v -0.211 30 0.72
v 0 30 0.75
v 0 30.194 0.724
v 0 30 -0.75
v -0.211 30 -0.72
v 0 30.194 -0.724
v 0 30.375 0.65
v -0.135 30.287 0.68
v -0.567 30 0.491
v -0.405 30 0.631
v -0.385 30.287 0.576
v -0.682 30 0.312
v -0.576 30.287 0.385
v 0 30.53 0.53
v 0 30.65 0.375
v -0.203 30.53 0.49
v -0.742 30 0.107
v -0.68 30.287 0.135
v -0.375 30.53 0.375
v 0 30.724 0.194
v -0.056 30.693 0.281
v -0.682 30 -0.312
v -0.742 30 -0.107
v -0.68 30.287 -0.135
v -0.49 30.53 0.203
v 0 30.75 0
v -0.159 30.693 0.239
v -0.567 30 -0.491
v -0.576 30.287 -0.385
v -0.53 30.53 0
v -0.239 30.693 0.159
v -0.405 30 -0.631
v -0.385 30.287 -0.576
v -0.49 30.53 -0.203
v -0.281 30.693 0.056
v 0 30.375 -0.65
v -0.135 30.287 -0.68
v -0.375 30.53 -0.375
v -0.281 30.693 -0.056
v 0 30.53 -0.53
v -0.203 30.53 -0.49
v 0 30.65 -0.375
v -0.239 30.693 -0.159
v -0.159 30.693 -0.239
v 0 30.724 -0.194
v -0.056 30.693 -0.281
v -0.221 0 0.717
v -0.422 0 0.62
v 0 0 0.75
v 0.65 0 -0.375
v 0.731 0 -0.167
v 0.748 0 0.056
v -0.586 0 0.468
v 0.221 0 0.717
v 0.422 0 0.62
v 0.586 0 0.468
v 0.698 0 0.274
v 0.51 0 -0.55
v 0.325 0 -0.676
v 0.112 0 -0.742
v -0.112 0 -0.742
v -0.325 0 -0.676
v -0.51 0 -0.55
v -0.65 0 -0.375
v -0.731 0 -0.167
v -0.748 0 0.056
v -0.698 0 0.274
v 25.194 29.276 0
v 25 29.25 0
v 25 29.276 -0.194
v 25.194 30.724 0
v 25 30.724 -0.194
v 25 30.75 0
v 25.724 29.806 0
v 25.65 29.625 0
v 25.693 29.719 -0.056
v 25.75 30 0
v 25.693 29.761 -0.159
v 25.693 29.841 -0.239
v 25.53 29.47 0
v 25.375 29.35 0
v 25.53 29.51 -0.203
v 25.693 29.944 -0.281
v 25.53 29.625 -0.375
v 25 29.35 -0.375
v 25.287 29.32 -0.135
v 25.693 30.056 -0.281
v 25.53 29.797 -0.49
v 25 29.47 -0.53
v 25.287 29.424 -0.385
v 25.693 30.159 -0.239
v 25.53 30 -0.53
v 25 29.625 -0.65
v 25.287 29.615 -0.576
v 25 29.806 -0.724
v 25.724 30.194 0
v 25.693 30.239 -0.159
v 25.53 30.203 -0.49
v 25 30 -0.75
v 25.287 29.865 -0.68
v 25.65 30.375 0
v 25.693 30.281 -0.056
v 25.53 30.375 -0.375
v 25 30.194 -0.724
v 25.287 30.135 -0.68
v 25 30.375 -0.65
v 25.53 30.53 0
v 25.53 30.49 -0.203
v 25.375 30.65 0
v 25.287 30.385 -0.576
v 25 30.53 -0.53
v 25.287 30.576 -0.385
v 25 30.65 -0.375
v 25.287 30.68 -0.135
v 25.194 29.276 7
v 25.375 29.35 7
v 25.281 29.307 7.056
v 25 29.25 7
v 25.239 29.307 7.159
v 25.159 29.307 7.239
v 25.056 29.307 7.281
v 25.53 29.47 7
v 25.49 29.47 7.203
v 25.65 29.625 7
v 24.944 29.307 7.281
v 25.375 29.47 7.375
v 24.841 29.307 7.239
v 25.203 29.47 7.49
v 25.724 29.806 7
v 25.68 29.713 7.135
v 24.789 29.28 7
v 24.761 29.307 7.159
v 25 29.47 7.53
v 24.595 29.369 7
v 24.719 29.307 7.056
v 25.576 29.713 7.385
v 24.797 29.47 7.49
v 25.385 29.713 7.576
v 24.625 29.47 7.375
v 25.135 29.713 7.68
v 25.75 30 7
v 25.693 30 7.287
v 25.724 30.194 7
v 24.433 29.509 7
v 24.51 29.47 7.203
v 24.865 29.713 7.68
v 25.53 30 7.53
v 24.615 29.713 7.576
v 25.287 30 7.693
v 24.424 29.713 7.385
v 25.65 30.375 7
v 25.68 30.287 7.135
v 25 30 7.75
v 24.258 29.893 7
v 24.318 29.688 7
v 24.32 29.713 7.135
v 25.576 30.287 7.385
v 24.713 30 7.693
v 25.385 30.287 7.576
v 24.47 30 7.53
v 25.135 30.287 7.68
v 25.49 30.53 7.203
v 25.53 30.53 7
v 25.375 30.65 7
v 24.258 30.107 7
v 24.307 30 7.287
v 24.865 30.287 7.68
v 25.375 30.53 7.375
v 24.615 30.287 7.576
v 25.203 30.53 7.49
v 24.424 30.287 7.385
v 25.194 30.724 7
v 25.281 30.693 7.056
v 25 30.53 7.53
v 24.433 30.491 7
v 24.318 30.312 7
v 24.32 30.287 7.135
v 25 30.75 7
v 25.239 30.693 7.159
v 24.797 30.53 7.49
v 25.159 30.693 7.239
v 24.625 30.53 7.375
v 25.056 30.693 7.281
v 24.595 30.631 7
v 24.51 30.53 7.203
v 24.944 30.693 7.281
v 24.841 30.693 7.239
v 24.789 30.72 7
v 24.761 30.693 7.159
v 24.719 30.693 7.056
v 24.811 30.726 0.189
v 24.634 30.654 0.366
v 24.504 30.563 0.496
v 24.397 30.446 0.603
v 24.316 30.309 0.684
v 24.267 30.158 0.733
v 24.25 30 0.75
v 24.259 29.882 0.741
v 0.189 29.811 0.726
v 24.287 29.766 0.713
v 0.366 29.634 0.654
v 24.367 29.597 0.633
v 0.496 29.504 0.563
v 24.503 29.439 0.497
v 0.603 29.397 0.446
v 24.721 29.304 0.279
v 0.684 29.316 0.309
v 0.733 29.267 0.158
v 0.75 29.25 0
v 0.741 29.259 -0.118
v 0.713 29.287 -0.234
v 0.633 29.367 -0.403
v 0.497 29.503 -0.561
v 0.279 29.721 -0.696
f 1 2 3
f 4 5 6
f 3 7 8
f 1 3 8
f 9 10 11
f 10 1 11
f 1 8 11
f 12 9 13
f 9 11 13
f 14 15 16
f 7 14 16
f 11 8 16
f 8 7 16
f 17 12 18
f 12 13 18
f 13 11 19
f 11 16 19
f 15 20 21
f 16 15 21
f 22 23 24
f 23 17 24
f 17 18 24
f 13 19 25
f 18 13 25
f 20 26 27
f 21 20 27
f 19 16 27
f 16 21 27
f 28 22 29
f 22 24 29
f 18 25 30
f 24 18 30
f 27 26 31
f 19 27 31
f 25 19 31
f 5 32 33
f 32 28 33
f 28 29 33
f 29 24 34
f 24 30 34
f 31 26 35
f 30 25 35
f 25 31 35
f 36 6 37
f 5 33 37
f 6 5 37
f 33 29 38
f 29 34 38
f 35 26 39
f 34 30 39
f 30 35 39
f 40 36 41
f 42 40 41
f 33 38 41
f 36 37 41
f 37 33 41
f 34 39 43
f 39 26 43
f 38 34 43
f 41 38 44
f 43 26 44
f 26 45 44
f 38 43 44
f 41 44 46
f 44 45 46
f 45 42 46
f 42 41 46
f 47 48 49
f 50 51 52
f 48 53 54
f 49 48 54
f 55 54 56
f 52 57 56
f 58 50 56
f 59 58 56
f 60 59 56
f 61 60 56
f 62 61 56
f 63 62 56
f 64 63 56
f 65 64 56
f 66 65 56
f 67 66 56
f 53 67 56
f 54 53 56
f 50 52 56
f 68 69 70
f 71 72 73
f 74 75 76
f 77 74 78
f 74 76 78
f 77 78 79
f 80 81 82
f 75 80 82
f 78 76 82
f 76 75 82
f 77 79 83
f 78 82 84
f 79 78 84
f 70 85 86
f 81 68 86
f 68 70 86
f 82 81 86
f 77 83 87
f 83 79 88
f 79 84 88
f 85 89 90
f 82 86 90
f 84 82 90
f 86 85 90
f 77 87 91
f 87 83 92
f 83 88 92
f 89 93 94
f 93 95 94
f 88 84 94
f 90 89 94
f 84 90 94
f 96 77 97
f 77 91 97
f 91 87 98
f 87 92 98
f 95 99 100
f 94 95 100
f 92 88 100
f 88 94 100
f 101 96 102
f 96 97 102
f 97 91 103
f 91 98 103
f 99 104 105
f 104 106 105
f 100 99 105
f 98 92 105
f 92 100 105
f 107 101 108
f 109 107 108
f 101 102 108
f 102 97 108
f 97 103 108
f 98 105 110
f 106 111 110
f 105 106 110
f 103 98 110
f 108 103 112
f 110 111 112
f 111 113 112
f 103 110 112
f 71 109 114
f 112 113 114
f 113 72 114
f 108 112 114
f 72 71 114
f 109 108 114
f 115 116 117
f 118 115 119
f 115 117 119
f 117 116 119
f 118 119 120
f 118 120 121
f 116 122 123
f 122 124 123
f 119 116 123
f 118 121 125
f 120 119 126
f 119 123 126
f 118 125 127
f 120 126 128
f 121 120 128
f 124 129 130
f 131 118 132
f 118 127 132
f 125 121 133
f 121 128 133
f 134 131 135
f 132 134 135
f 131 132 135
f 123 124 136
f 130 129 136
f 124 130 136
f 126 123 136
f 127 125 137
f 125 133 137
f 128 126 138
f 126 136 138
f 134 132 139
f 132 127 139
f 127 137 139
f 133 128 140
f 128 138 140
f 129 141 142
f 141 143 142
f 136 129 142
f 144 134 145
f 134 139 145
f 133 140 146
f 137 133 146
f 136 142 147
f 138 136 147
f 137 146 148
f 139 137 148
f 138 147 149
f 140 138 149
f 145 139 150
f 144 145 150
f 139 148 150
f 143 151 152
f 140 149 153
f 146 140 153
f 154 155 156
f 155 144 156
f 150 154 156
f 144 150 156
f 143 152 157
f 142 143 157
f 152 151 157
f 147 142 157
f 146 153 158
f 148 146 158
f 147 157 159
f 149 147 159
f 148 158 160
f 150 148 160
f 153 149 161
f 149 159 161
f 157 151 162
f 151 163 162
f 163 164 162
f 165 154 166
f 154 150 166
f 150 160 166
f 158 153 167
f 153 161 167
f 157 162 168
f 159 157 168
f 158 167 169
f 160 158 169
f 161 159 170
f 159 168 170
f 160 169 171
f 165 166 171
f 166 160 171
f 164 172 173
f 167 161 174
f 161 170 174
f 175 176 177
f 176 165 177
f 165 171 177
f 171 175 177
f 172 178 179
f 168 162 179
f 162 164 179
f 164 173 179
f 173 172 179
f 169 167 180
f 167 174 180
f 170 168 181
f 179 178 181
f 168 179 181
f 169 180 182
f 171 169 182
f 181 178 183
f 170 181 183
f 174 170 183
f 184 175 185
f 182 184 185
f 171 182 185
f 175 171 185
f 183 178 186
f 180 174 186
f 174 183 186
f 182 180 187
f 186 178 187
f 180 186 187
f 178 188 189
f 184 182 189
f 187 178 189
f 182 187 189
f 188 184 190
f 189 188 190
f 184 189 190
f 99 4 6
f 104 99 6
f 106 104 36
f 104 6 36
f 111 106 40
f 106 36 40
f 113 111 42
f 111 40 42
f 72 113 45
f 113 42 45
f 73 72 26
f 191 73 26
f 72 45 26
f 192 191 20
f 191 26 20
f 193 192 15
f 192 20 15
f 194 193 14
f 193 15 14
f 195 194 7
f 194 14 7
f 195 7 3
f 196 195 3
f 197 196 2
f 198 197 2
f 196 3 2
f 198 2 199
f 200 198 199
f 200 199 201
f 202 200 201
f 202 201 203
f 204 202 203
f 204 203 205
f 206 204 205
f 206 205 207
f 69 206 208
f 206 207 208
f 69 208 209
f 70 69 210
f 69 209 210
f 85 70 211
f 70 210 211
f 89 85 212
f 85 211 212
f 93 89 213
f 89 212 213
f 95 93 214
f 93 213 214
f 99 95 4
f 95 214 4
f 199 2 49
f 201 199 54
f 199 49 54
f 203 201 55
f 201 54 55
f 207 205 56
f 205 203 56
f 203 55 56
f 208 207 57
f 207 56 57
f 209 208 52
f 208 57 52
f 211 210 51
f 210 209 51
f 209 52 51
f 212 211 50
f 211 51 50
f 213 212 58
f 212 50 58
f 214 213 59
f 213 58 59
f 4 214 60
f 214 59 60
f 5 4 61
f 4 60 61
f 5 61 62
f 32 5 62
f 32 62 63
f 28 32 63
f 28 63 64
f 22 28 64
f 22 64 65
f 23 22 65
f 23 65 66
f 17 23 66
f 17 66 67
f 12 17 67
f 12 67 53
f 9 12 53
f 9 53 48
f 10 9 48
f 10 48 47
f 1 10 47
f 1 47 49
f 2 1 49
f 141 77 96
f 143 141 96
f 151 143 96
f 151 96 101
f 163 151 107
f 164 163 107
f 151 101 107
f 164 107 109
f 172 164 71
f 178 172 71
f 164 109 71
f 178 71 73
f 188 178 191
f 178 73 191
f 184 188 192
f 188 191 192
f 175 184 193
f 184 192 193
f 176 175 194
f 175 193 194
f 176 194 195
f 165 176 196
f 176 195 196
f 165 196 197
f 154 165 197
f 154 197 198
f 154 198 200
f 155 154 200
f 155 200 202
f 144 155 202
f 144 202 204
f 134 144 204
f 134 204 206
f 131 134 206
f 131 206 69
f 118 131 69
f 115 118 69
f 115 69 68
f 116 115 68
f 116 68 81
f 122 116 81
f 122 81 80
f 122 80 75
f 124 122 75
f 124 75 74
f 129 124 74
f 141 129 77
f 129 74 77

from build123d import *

# Parameters (mm, degrees)
SKETCH_1_R      = 0.75
EXTRUDE_1_DEPTH = 30
SKETCH_3_R      = 0.75
EXTRUDE_2_DEPTH = 25
SKETCH_5_R      = 0.75
EXTRUDE_3_DEPTH = 7


with BuildPart() as part:
    # 草图1 → 凸台-拉伸1 (new body)
    with BuildSketch(Plane(origin=(0, 0, 0), x_dir=(1, 0, 0), z_dir=(0, 1, 0))):
        with Locations(Location((0, 0, 0), (0, 0, 270))):
            Circle(SKETCH_1_R)
    extrude(amount=EXTRUDE_1_DEPTH)

    # 草图2 → 旋转1 (revolve)
    with BuildSketch(Plane(origin=(0, 0, 0), x_dir=(0, 0, -1), z_dir=(1, 0, 0))):
        with BuildLine():
            Line((0, 30.75), (0, 29.25))
            ThreePointArc((0, 29.25), (0.75, 30), (0, 30.75))
        make_face()
    revolve(axis=Axis((0, 30.75, 0), (0, -1, 0)))

    # 草图3 → 凸台-拉伸2 (add)
    with BuildSketch(Plane(origin=(0, 0, 0), x_dir=(0, 0, -1), z_dir=(1, 0, 0))):
        with Locations((0, 30)):
            Circle(SKETCH_3_R)
    extrude(amount=EXTRUDE_2_DEPTH)

    # 草图4 → 旋转2 (revolve)
    with BuildSketch(Plane.XY):
        with BuildLine():
            Line((24.25, 30), (25.75, 30))
            ThreePointArc((25.75, 30), (25, 30.75), (24.25, 30))
        make_face()
    revolve(axis=Axis((24.25, 30, 0), (1, 0, 0)))

    # 草图5 → 凸台-拉伸3 (add)
    with BuildSketch(Plane.XY):
        with Locations((25, 30)):
            Circle(SKETCH_5_R)
    extrude(amount=EXTRUDE_3_DEPTH)

    # 草图6 → 旋转3 (revolve)
    with BuildSketch(Plane.XY.offset(7)):
        with BuildLine():
            Line((25, 30.75), (25, 29.25))
            ThreePointArc((25, 29.25), (25.75, 30), (25, 30.75))
        make_face()
    revolve(axis=Axis((25, 30.75, 7), (0, -1, 0)))


solid = part.part
